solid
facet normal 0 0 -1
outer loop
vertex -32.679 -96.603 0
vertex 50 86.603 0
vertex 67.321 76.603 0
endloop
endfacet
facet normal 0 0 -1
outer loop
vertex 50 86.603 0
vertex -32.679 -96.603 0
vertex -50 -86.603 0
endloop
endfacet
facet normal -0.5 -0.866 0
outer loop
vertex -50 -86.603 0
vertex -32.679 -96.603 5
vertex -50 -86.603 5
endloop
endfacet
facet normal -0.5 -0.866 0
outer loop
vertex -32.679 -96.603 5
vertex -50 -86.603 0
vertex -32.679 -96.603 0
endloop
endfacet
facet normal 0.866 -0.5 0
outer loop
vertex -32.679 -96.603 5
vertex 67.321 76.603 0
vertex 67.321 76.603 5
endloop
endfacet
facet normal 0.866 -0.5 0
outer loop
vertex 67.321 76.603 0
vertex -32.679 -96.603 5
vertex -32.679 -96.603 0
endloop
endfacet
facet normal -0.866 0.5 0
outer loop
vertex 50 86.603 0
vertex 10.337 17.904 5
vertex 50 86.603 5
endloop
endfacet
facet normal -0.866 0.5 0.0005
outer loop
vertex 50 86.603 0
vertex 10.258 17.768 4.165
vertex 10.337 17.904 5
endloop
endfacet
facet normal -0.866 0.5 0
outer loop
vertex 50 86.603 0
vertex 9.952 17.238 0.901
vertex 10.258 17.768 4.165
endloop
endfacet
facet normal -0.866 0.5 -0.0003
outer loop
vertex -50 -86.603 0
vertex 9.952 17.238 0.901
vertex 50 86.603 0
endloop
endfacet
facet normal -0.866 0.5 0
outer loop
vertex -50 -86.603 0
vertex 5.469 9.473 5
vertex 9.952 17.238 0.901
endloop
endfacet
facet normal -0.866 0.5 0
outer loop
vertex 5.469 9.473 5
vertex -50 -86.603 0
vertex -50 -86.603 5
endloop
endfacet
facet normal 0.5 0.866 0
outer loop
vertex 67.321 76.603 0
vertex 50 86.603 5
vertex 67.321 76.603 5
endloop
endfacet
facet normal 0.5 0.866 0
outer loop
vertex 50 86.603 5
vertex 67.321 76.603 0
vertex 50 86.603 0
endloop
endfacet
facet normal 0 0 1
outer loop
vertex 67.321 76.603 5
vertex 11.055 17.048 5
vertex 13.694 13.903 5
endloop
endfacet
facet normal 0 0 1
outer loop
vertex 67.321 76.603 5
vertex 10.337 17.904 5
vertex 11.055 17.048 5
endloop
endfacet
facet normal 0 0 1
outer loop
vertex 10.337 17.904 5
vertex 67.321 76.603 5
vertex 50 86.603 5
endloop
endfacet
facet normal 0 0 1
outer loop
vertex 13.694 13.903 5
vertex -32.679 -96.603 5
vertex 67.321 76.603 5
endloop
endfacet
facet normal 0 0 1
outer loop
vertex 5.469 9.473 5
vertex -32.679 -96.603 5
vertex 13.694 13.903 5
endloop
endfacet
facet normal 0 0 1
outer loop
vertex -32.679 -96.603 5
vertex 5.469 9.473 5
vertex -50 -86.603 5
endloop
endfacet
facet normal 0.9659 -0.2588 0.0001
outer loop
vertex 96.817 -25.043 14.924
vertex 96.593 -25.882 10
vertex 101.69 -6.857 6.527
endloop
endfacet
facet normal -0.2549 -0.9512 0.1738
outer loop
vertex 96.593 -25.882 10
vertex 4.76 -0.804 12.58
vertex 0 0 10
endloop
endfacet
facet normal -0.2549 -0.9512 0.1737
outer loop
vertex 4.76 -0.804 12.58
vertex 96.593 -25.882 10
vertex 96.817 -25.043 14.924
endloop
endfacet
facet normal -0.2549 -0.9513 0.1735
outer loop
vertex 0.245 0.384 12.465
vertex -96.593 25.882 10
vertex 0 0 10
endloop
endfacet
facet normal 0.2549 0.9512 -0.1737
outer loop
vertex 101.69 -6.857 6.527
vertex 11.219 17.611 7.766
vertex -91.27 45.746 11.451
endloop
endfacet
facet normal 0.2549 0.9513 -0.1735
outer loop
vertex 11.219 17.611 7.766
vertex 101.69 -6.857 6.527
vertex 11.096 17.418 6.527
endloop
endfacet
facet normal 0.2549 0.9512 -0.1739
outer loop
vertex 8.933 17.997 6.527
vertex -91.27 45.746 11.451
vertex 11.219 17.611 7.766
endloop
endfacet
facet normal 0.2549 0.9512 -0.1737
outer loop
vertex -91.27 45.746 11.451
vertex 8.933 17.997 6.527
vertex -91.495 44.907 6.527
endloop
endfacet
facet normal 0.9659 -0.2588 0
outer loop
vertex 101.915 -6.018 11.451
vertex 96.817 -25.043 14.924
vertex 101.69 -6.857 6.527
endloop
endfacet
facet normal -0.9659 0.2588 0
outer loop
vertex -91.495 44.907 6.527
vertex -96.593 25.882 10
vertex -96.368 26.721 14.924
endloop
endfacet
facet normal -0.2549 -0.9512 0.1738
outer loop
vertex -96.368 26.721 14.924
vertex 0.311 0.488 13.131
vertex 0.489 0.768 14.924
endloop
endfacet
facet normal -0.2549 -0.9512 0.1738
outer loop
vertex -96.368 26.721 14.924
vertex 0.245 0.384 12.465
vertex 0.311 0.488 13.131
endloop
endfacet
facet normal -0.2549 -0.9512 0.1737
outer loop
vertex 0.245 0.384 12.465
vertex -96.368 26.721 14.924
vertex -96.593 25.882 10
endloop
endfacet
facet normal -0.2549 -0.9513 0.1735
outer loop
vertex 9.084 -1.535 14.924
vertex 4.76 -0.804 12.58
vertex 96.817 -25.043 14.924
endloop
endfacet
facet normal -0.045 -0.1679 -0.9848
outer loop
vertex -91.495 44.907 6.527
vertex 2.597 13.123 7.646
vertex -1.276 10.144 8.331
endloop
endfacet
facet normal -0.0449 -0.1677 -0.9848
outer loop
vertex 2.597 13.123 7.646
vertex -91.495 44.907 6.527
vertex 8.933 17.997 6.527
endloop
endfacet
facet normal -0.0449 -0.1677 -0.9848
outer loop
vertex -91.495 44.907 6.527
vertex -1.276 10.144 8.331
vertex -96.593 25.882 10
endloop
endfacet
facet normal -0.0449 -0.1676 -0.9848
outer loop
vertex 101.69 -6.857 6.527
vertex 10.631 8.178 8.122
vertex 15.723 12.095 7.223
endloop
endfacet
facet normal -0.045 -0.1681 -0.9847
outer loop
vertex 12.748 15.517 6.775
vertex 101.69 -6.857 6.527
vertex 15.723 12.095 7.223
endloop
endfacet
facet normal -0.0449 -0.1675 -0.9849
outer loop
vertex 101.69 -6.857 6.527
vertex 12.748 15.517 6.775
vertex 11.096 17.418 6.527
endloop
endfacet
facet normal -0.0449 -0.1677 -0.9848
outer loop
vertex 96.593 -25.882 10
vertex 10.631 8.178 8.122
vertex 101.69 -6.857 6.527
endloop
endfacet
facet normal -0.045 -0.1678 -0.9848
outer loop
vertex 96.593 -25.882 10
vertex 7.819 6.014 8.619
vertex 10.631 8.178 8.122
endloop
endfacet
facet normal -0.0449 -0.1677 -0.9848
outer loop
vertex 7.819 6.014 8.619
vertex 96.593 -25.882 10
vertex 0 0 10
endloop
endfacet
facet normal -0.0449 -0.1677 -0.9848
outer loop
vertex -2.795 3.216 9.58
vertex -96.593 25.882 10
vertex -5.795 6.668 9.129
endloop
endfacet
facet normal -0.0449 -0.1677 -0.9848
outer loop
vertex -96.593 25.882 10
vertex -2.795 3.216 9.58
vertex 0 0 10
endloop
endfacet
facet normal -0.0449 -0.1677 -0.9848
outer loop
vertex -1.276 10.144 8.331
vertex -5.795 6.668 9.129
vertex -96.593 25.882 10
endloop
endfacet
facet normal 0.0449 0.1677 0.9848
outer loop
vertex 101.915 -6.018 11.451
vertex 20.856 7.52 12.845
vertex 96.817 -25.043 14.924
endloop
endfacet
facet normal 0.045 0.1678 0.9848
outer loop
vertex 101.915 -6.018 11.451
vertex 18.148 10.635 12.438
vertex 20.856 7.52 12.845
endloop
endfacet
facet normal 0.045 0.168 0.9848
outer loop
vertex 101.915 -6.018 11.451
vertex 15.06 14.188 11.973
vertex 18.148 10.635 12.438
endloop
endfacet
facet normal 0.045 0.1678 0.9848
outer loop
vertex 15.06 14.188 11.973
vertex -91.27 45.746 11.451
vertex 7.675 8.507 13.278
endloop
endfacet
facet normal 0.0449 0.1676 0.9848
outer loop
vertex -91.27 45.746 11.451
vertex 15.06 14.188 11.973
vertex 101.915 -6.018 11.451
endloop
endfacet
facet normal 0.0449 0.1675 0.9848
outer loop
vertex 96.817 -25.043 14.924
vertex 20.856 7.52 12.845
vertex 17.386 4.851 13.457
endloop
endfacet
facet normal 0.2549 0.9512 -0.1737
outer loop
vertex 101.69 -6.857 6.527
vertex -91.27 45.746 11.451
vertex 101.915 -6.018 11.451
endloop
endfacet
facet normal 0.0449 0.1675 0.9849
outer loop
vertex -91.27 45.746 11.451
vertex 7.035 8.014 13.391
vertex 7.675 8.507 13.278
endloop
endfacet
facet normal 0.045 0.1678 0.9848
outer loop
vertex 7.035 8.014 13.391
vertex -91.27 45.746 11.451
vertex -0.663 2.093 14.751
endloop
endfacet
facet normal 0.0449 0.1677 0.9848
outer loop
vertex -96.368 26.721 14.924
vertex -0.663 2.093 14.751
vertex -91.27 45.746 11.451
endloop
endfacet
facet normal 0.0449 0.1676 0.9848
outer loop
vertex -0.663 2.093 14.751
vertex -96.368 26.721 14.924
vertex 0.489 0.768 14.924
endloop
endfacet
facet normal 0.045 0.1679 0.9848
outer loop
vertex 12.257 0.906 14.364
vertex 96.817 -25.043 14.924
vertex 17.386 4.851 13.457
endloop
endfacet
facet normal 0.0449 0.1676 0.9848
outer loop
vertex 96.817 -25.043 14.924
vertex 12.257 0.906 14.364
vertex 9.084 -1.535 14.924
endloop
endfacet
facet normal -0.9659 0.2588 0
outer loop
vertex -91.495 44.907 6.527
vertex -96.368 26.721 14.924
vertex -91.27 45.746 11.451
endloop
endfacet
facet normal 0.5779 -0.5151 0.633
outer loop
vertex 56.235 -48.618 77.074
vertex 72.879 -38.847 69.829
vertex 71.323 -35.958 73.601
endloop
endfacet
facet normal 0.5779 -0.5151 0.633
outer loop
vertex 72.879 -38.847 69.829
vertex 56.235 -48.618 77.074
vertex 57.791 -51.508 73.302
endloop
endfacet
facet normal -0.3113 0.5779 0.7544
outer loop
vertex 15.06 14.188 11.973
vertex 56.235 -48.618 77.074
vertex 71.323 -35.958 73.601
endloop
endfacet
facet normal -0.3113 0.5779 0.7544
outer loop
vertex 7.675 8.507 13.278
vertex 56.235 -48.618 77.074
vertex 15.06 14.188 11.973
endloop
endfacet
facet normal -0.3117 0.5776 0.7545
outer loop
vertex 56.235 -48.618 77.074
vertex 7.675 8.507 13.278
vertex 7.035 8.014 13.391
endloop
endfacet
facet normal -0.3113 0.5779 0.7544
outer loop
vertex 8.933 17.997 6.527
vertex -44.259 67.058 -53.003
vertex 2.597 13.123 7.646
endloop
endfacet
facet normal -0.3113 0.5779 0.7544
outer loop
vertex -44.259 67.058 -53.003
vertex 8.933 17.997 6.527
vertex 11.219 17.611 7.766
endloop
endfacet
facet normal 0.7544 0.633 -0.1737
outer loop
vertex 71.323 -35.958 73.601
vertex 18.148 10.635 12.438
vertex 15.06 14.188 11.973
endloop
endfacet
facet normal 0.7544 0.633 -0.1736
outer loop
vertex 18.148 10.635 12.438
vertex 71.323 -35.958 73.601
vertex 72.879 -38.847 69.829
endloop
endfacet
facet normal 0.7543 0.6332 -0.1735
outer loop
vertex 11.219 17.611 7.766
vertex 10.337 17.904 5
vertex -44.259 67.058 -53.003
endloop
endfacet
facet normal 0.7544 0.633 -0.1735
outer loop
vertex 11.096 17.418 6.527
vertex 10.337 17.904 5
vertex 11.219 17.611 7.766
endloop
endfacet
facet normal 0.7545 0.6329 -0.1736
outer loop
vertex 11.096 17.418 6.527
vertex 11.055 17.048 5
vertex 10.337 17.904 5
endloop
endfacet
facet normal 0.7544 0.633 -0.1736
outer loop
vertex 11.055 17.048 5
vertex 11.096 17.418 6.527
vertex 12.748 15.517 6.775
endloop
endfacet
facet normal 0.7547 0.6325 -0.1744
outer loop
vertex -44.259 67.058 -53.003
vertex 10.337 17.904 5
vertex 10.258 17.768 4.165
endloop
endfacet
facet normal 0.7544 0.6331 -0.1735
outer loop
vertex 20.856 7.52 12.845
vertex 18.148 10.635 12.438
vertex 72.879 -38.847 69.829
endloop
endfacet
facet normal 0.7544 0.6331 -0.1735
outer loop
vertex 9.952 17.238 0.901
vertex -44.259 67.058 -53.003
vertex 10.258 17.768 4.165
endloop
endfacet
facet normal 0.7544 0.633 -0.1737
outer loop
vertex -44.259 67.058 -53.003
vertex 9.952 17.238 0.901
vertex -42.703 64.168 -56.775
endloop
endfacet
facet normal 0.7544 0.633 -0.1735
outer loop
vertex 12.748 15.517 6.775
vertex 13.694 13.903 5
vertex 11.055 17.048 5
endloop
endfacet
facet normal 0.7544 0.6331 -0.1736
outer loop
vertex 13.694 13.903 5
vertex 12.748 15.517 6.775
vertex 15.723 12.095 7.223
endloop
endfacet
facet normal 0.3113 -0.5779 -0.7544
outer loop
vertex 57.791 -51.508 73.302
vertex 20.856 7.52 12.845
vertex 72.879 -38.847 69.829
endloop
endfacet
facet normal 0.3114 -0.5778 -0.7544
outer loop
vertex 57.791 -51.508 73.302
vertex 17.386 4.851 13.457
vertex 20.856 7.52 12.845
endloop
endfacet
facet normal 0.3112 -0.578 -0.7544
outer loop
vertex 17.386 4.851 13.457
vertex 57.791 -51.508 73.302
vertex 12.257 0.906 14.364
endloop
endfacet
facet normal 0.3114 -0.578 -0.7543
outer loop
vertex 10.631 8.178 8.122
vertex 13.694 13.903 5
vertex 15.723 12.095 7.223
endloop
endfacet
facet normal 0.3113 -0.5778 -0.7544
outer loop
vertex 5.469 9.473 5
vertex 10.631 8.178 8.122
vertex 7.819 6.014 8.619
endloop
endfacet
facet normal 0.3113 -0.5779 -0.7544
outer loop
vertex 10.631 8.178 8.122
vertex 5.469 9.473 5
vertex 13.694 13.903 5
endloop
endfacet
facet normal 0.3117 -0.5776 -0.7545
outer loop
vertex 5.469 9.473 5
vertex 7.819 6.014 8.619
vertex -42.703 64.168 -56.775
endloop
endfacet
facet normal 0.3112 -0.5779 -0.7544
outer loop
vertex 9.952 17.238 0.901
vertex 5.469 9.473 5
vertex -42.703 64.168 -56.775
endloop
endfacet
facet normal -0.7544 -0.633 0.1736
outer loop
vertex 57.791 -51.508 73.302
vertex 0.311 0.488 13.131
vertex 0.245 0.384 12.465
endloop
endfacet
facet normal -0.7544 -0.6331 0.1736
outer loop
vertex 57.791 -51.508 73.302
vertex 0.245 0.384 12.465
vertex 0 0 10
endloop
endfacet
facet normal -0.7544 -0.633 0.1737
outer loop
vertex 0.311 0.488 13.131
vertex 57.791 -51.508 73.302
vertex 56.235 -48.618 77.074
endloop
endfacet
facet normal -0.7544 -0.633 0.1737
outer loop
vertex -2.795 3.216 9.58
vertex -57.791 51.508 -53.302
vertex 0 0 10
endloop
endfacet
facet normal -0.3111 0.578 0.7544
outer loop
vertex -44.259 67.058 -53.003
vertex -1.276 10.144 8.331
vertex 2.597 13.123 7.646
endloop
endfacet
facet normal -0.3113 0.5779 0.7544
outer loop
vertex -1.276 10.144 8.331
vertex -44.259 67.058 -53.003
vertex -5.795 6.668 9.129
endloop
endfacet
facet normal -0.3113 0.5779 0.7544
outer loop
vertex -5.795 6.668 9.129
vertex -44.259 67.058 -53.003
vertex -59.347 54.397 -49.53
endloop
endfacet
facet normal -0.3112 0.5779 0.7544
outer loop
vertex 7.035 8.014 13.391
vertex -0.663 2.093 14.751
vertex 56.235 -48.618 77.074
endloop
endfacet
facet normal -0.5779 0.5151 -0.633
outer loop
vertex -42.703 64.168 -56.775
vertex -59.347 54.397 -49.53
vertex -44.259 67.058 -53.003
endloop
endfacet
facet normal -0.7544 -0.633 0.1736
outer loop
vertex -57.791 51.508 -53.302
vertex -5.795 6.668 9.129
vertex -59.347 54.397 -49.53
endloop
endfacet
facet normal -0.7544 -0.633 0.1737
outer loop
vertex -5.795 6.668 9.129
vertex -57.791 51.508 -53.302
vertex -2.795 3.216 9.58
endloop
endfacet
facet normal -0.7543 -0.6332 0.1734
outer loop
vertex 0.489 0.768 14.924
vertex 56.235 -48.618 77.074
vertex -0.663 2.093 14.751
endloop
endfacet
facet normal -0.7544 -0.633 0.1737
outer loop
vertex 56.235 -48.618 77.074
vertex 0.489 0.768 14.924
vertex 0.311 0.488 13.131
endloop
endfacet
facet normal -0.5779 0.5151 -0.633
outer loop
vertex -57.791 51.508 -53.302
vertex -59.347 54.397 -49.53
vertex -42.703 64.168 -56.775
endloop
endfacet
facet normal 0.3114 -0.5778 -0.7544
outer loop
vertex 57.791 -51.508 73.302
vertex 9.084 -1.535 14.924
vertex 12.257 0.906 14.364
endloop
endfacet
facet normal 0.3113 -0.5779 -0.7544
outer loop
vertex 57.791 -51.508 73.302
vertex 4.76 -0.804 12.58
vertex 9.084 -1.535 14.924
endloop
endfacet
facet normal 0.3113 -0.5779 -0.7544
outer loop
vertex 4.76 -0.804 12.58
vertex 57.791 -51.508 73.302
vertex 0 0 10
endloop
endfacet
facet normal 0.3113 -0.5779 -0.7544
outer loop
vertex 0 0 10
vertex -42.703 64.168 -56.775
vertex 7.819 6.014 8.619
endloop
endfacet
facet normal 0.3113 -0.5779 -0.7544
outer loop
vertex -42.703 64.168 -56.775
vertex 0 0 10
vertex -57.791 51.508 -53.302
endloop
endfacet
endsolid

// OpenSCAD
module text1() {
    rotate([90,0,-30])
        translate([0,0,-100])
        cube([20,5,200]);
}

module text2() {
    translate([0,0,10])
    rotate([90,10,75])
        translate([0,0,-100])
        cube([20,5,200]);
}

module text3() {
    translate([0,0,10])
    rotate([50,10,40])
        translate([0,0,-100])
        cube([20,5,200]);
}

text1();
text2();
text3();
